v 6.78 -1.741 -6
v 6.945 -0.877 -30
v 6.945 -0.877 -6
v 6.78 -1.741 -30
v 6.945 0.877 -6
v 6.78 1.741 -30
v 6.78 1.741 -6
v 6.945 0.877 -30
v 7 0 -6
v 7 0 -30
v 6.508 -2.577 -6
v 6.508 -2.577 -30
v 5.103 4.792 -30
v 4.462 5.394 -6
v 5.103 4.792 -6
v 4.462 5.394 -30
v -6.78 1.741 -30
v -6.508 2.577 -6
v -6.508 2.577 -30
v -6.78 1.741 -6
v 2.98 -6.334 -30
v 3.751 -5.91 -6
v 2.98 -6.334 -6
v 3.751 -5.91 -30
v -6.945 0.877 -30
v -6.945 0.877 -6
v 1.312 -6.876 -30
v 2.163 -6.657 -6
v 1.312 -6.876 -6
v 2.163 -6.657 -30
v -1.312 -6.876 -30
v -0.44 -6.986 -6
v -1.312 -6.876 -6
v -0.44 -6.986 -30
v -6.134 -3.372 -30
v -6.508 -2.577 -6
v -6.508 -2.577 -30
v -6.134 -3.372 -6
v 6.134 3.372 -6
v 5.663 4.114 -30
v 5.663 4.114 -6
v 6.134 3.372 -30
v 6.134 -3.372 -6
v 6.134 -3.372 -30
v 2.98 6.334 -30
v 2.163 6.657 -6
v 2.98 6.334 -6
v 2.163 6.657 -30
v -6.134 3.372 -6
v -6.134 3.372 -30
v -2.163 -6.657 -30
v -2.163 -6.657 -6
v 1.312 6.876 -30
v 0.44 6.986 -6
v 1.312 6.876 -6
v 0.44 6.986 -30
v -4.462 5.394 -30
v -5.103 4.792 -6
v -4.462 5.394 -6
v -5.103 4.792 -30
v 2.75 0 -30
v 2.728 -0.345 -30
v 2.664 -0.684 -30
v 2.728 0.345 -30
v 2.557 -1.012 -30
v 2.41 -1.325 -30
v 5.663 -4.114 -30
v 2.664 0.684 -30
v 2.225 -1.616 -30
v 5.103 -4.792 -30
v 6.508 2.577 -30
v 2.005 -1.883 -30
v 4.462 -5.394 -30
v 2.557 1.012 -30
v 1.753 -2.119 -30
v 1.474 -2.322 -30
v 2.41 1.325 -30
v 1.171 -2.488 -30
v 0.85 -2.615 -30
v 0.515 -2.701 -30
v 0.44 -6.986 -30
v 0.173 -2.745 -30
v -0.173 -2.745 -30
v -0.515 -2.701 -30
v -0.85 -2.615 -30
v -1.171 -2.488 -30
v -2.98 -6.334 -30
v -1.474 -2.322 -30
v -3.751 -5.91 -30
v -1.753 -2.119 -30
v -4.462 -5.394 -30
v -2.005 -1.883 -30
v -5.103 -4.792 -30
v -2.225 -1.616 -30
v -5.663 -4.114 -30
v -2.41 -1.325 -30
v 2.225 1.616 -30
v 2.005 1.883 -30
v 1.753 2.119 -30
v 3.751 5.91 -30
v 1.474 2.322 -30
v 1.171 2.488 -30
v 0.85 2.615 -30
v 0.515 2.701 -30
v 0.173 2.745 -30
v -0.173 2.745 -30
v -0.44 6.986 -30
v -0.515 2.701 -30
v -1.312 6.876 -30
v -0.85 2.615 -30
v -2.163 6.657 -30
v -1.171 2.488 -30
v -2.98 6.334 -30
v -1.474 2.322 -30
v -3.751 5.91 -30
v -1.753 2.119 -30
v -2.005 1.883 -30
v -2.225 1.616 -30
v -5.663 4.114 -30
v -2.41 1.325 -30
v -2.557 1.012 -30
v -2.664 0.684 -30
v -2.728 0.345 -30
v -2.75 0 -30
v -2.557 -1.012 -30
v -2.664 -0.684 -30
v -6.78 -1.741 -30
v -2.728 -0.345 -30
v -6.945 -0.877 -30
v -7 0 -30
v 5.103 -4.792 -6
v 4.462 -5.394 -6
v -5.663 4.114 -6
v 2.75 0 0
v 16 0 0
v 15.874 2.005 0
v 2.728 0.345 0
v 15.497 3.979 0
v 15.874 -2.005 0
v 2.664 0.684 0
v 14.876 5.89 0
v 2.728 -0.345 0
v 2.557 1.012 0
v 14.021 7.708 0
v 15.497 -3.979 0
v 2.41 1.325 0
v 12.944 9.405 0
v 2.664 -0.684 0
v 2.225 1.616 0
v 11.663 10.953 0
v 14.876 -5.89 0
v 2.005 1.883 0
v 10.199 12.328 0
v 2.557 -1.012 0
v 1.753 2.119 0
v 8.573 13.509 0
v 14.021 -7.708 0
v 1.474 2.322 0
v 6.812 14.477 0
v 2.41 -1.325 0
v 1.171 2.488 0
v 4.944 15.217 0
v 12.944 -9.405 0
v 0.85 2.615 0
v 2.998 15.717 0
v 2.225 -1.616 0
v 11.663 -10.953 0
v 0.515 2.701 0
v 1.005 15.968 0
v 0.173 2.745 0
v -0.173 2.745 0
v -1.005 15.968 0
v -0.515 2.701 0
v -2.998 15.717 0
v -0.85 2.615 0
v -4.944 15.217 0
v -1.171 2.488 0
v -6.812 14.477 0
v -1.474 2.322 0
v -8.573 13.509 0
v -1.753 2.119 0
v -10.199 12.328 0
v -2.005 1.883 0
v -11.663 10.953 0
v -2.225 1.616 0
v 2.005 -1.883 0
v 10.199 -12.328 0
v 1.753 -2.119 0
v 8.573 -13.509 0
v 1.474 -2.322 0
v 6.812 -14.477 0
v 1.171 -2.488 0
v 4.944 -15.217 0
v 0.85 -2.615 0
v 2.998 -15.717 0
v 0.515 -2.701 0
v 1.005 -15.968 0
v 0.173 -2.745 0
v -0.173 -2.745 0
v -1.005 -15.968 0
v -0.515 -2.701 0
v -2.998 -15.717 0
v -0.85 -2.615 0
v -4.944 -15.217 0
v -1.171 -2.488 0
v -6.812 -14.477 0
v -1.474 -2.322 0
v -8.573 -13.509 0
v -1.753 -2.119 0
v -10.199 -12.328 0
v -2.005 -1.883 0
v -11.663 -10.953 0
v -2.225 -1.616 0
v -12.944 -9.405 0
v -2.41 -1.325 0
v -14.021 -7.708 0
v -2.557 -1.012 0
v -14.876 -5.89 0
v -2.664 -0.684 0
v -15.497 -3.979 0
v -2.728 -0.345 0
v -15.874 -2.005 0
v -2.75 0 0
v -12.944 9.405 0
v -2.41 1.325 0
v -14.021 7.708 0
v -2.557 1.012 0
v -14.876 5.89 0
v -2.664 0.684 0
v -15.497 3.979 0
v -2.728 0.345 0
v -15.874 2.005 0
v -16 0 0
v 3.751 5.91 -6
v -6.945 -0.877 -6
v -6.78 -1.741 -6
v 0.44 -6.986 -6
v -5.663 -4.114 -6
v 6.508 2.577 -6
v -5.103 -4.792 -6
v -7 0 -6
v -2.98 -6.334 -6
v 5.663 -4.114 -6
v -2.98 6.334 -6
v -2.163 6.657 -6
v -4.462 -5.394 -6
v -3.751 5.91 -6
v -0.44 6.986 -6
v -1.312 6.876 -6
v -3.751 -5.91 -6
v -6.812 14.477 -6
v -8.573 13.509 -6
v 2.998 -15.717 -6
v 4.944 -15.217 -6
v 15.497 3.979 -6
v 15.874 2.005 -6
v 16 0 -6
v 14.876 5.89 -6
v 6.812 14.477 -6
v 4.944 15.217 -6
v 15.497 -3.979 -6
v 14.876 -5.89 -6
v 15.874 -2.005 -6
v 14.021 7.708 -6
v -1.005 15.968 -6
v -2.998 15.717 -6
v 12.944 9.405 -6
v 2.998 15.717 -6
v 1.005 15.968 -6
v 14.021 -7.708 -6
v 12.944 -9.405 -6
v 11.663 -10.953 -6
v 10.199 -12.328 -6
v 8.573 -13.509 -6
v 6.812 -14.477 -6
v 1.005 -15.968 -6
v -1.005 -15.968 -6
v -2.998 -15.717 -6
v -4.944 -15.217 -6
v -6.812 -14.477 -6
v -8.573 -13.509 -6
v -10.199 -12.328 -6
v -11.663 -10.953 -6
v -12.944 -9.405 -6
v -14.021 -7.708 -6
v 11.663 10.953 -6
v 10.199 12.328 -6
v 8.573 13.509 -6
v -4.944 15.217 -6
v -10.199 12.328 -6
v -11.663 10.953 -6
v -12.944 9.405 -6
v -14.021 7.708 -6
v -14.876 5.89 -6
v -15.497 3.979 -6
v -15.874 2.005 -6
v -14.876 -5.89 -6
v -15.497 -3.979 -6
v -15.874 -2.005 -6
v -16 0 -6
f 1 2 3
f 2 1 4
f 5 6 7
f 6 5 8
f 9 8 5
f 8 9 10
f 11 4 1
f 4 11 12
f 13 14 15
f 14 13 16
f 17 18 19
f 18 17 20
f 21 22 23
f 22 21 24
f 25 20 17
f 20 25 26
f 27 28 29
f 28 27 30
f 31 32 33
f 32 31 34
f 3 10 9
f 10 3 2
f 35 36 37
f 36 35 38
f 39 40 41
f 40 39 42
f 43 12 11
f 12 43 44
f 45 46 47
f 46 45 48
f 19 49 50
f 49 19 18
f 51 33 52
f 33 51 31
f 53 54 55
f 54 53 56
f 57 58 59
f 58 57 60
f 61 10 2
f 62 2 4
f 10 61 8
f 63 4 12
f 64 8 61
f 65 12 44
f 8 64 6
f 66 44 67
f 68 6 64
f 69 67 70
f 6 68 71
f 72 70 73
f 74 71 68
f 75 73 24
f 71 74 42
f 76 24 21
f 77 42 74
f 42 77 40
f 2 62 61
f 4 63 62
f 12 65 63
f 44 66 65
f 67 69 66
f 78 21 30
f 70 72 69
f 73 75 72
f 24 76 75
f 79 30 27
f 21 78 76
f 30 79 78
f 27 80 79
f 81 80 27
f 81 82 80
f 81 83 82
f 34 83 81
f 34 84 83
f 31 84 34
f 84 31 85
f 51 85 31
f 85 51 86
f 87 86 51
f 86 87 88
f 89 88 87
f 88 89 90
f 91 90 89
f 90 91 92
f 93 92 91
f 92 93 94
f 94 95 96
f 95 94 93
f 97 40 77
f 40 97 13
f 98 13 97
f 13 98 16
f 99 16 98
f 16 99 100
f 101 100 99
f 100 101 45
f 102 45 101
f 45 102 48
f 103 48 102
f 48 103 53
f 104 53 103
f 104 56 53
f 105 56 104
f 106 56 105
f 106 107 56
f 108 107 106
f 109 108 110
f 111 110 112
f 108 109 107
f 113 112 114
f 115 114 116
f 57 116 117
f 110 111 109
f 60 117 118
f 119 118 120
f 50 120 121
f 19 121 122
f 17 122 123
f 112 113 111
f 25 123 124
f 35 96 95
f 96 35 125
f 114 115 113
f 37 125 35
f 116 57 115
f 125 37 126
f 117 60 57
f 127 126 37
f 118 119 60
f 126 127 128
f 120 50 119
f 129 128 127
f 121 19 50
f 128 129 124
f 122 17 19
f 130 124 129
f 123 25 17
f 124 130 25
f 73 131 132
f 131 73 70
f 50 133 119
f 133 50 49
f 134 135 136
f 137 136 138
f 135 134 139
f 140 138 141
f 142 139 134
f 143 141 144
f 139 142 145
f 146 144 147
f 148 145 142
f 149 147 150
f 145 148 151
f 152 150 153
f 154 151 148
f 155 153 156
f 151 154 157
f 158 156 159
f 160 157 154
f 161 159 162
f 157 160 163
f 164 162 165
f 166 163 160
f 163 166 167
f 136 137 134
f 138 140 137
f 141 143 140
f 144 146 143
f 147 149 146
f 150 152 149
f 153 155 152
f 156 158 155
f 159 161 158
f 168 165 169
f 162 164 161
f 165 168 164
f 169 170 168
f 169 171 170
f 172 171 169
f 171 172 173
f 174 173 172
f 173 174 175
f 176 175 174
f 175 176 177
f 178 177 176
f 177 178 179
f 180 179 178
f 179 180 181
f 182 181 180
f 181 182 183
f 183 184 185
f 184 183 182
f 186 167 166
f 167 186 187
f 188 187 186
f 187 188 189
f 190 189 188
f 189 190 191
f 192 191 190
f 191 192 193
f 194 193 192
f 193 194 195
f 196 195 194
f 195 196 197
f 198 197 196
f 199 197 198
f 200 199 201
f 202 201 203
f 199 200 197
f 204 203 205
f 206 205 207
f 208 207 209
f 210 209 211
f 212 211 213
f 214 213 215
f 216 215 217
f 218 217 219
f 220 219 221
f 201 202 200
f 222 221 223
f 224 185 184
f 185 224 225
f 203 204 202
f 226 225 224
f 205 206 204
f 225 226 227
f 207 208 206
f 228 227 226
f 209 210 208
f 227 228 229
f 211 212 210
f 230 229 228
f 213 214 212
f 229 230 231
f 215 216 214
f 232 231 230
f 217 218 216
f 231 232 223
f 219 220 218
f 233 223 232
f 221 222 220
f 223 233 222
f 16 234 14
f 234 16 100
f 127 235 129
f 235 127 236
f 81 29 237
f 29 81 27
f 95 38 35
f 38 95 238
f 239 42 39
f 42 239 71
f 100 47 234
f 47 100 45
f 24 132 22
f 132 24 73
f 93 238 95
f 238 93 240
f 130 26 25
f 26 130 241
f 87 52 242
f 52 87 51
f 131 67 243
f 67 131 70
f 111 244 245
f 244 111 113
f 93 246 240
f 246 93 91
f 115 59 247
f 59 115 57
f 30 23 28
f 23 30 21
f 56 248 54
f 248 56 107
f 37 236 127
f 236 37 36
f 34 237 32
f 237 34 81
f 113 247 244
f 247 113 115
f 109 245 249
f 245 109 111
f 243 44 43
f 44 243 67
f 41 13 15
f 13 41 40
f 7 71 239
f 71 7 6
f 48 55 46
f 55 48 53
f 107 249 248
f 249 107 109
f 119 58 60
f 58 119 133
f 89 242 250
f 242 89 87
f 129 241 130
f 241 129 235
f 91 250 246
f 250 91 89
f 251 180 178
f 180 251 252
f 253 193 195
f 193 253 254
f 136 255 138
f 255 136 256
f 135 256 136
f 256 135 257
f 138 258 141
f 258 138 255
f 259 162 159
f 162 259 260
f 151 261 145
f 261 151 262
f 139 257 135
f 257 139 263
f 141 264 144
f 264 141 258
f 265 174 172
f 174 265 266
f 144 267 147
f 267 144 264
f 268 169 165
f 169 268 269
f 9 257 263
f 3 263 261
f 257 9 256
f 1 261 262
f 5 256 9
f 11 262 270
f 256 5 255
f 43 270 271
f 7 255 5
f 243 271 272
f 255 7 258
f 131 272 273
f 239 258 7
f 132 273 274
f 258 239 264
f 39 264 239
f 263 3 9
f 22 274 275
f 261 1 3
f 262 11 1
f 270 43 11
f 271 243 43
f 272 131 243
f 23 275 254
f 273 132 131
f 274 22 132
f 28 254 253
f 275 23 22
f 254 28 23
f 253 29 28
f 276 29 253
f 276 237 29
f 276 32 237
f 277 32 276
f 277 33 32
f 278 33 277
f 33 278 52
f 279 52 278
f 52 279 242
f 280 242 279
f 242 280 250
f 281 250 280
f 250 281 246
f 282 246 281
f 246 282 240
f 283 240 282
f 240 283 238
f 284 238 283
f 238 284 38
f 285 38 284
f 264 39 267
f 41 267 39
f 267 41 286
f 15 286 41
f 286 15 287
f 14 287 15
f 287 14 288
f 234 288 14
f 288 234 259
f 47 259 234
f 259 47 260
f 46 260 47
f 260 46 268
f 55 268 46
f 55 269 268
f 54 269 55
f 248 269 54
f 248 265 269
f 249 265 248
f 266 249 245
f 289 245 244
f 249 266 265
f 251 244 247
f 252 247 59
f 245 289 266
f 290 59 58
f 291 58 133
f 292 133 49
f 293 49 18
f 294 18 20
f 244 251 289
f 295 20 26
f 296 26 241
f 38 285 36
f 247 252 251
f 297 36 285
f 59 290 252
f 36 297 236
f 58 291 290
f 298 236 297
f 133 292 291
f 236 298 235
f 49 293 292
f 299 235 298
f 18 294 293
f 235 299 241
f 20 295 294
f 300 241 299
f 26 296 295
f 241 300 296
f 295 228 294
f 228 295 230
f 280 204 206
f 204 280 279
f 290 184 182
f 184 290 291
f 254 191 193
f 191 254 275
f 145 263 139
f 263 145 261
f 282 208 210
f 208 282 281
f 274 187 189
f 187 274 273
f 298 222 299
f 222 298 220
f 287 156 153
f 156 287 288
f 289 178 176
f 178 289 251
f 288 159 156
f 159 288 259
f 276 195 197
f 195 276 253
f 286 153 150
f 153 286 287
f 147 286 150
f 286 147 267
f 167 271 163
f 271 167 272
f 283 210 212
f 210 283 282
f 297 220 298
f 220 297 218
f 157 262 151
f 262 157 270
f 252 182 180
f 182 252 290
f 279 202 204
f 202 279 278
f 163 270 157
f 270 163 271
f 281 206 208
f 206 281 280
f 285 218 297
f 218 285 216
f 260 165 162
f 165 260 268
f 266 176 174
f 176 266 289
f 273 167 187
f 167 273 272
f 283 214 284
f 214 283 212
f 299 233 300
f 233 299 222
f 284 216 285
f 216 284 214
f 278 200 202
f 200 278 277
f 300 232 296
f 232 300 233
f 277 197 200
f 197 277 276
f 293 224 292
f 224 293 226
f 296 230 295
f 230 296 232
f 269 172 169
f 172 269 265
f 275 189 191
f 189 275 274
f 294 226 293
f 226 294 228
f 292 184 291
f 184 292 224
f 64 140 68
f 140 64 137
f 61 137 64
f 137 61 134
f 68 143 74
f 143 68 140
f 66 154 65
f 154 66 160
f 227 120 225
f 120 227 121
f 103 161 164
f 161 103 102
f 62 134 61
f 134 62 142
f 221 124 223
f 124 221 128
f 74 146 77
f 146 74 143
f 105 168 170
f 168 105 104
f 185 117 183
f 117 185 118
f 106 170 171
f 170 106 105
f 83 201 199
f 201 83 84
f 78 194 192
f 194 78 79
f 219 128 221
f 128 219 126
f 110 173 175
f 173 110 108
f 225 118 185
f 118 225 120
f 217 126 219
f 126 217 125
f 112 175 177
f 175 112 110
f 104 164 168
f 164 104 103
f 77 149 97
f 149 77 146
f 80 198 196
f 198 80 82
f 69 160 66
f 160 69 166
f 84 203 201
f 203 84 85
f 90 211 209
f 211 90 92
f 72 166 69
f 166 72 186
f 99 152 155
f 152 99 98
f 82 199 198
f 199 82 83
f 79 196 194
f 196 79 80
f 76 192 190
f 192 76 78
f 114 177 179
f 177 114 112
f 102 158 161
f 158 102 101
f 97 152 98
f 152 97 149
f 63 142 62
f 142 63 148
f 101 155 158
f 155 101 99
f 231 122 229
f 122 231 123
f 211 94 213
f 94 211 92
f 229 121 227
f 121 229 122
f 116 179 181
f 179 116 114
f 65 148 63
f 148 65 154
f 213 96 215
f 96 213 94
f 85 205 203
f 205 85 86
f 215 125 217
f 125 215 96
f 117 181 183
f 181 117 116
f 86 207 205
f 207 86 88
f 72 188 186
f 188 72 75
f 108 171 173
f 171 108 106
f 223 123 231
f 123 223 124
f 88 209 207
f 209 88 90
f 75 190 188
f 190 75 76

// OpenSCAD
$fn = 50;


difference() {
	union() {
		translate(v = [0, 0, -30.0000000000]) {
			cylinder(h = 30, r = 7.0000000000);
		}
		translate(v = [0, 0, -6.0000000000]) {
			cylinder(h = 6, r = 16.0000000000);
		}
	}
	union() {
		#translate(v = [0, 0, -30]) {
			cylinder(h = 30, r = 2.7500000000);
		}
	}
}
